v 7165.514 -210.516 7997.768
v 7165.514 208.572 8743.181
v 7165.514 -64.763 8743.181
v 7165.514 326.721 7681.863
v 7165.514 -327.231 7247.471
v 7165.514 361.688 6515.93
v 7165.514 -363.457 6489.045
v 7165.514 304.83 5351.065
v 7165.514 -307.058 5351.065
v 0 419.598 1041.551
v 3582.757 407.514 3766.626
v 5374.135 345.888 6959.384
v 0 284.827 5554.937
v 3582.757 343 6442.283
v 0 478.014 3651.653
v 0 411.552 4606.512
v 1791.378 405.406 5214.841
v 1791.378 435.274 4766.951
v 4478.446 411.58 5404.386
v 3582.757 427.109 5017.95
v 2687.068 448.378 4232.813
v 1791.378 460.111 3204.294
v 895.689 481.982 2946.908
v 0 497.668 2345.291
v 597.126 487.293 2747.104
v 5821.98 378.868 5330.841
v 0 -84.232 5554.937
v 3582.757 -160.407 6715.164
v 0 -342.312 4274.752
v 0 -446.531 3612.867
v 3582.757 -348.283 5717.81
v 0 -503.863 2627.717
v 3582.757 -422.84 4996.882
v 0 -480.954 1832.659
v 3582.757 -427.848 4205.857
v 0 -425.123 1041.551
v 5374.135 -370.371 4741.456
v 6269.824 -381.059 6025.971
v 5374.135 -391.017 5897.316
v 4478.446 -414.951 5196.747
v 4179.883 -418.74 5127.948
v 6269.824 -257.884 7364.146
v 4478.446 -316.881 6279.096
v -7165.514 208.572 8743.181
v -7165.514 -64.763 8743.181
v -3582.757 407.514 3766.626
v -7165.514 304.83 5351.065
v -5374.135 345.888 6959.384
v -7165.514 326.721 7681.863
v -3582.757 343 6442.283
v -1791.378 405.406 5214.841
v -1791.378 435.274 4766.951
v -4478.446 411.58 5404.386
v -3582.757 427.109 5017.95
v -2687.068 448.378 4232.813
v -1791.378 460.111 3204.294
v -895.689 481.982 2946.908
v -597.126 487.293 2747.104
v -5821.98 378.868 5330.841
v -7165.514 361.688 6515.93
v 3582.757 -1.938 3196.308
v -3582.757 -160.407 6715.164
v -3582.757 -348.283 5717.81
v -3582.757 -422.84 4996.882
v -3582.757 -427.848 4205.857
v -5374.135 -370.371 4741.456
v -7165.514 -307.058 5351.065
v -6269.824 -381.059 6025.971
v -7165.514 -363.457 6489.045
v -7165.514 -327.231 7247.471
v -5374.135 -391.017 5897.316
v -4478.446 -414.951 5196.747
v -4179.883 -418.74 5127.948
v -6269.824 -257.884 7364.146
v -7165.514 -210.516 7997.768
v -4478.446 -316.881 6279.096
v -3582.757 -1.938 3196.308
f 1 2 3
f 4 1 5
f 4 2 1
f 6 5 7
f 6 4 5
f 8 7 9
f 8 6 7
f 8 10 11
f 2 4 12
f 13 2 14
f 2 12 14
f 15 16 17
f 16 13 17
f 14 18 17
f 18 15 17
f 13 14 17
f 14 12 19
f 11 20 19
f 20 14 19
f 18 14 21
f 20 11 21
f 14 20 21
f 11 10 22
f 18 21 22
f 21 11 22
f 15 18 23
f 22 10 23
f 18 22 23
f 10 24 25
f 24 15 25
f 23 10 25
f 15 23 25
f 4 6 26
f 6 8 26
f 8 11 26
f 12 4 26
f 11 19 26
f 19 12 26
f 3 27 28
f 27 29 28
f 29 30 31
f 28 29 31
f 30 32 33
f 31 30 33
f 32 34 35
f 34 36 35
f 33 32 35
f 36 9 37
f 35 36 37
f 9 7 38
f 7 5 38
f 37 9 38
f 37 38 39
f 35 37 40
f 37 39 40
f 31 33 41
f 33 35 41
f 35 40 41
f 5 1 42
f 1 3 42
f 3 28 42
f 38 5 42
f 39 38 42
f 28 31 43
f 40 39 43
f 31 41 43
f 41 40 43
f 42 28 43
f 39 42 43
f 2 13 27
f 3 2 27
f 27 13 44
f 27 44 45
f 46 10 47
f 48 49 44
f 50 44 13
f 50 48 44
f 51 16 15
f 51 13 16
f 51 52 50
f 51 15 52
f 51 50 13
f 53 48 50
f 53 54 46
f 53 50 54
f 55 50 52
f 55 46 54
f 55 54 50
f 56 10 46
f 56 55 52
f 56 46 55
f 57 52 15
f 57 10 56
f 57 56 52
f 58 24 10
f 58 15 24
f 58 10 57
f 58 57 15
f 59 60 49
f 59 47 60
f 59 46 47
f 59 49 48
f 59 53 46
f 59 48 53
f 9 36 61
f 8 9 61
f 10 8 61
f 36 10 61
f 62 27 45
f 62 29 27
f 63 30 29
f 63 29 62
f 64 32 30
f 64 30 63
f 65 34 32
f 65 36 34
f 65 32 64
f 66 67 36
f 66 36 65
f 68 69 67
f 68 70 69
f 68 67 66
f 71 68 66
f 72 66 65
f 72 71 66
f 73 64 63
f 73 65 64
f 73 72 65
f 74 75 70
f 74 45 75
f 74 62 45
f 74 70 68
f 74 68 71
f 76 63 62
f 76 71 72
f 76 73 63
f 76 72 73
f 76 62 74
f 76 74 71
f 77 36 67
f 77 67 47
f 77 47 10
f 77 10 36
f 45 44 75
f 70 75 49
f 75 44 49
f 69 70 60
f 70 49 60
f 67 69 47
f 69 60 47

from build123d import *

# Parameters (mm, degrees)
SKETCH4_W          = 14453.89622635
SKETCH4_H          = 1933.47388346
CUT_EXTRUDE1_DEPTH = 11582.4


with BuildPart() as part:
    # Surface-Knit3: read off the stored shape, not the designer's step
    # Surface-Knit3: loft between two sections, ruled curve by curve
    surface_knit3_from = [
        Edge.make_bspline([(-18747.913519228, -33.291870667, 13896.687632722), (-18747.913519228, -38.996184814, 13864.165767164), (-18747.913519228, -47.395291612, 13815.326003064), (-18747.913519228, -58.165952375, 13750.098143781), (-18747.913519228, -66.001529187, 13701.124565247), (-18747.913519228, -73.566342631, 13652.099705476), (-18747.913519228, -80.832031101, 13603.025026666), (-18747.913519228, -87.770232991, 13553.901991014), (-18747.913519228, -94.352615351, 13504.731967053), (-18747.913519228, -100.550845229, 13455.516323317), (-18747.913519228, -106.336535483, 13406.256569089), (-18747.913519228, -111.681298966, 13356.954213653), (-18747.913519229, -116.556993503, 13307.61047422), (-18747.913519228, -120.934768836, 13258.226931647), (-18747.913519228, -124.787293043, 13208.804970061), (-18747.913519228, -128.084117978, 13159.345935701), (-18747.913519228, -130.802699249, 13109.851595466), (-18747.913519228, -132.971906369, 13060.326885108), (-18747.913519228, -134.6147206, 13010.776434683), (-18747.913519229, -135.756697629, 12961.204893031), (-18747.913519228, -136.422147725, 12911.6170991), (-18747.913519228, -136.635930916, 12862.017549986), (-18747.913519229, -136.422737614, 12812.411014843), (-18747.913519229, -135.807258229, 12762.802262828), (-18747.913519228, -134.814210194, 12713.195933045), (-18747.913519229, -133.468310939, 12663.596664599), (-18747.913519229, -131.794267082, 12614.009184506), (-18747.913519228, -129.816785237, 12564.438219781), (-18747.913519228, -126.808507959, 12498.371846627), (-18747.913519229, -122.413125762, 12415.853516057), (-18747.913519228, -118.351231597, 12349.932887402), (-18747.913519228, -116.216834875, 12317.002326935)], [0, 0, 0, 0, 0.0625, 0.09375, 0.125, 0.15625, 0.1875, 0.21875, 0.25, 0.28125, 0.3125, 0.34375, 0.375, 0.40625, 0.4375, 0.46875, 0.5, 0.53125, 0.5625, 0.59375, 0.625, 0.65625, 0.6875, 0.71875, 0.75, 0.78125, 0.8125, 0.84375, 0.875, 0.9375, 1, 1, 1, 1], 3),
        Edge.make_bspline([(-18747.913519228, 119.318075617, 12317.002326935), (-18747.913519228, 121.427288002, 12349.906607435), (-18747.913519229, 125.245922776, 12415.730130778), (-18747.913519228, 129.825309485, 12514.504470047), (-18747.913519228, 133.30695484, 12613.31210814), (-18747.913519229, 135.741648881, 12712.147152624), (-18747.913519228, 136.940477423, 12794.527823229), (-18747.913519228, 137.426859553, 12860.440198394), (-18747.913519229, 137.561675928, 12909.877734467), (-18747.913519228, 137.472892207, 12959.317860595), (-18747.913519228, 137.166808865, 13008.759745982), (-18747.913519229, 136.649726377, 13058.202559828), (-18747.913519228, 135.92839574, 13107.645897141), (-18747.913519229, 135.008041704, 13157.088667935), (-18747.913519228, 133.897934193, 13206.530592909), (-18747.913519229, 132.578650086, 13255.9684353), (-18747.913519228, 131.024813307, 13305.398752426), (-18747.913519229, 129.212987855, 13354.817901918), (-18747.913519229, 127.119170545, 13404.222444449), (-18747.913519228, 124.719358193, 13453.608940689), (-18747.913519228, 121.079727689, 13519.428839404), (-18747.913519229, 115.645624536, 13601.640967503), (-18747.913519228, 107.517806813, 13700.167248777), (-18747.913519228, 97.591624664, 13798.537247751), (-18747.913519228, 89.647575896, 13863.994418396), (-18747.913519228, 85.311986798, 13896.687632722)], [0, 0, 0, 0, 0.0625, 0.125, 0.1875, 0.25, 0.3125, 0.34375, 0.375, 0.40625, 0.4375, 0.46875, 0.5, 0.53125, 0.5625, 0.59375, 0.625, 0.65625, 0.6875, 0.71875, 0.75, 0.8125, 0.875, 0.9375, 1, 1, 1, 1], 3),
        Edge.make_line((-18747.913519228, -116.216834875, 12317.002326935), (-18747.913519228, 119.318075617, 12317.002326935)),
        Edge.make_line((-18747.913519228, 85.311986798, 13896.687632722), (-18747.913519228, -33.291870667, 13896.687632722)),
    ]
    surface_knit3_to = [
        Edge.make_bspline([(0, -84.232166366, 5554.937339031), (0, -101.79672971, 5462.01880107), (0, -129.357236092, 5322.688455814), (0, -167.450345309, 5136.915845411), (0, -196.42273433, 4997.563298319), (0, -225.527238329, 4858.164324098), (0, -254.493580408, 4718.695334102), (0, -283.051234262, 4579.132854165), (0, -310.930075038, 4439.453396797), (0, -337.859297077, 4299.633408984), (0, -363.569297954, 4159.649494874), (0, -387.788376954, 4019.477965049), (0, -410.248359478, 3879.095632891), (0, -430.67509131, 3738.47845439), (0, -448.805142559, 3597.603925682), (0, -464.354292773, 3456.446555804), (0, -477.089703526, 3314.988236979), (0, -487.191948377, 3173.270264273), (0, -494.801263778, 3031.328137811), (0, -500.07567179, 2889.199911148), (0, -503.164086093, 2746.922333211), (0, -504.220248686, 2604.532838899), (0, -503.395317672, 2462.068506491), (0, -500.841843712, 2319.566586545), (0, -496.711615776, 2177.064276035), (0, -491.156848446, 2034.598715165), (0, -484.32952174, 1892.20725343), (0, -476.381724655, 1749.92678358), (0, -464.49346954, 1560.417817143), (0, -447.592223813, 1323.994831696), (0, -432.705315369, 1135.550220194), (0, -425.123116762, 1041.550751068)], [0, 0, 0, 0, 0.0625, 0.09375, 0.125, 0.15625, 0.1875, 0.21875, 0.25, 0.28125, 0.3125, 0.34375, 0.375, 0.40625, 0.4375, 0.46875, 0.5, 0.53125, 0.5625, 0.59375, 0.625, 0.65625, 0.6875, 0.71875, 0.75, 0.78125, 0.8125, 0.84375, 0.875, 0.9375, 1, 1, 1, 1], 3),
        Edge.make_bspline([(0, 419.597820632, 1041.550751068), (0, 429.543853386, 1135.440295654), (0, 447.399313962, 1323.348388039), (0, 468.40352921, 1605.540291192), (0, 483.959642332, 1888.004992674), (0, 494.398471436, 2170.685059083), (0, 499.108853625, 2406.384051023), (0, 500.649329193, 2594.993626218), (0, 500.73224947, 2736.469141906), (0, 499.783776553, 2877.955586877), (0, 497.845912984, 3019.446002413), (0, 494.958769462, 3160.933085391), (0, 491.166077703, 3302.409896298), (0, 486.504516068, 3443.868951949), (0, 481.026248706, 3585.30385973), (0, 474.686548897, 3726.701576336), (0, 467.416919745, 3868.047425633), (0, 459.158051456, 4009.327380859), (0, 449.846016915, 4150.527054909), (0, 439.419277989, 4291.632309199), (0, 423.947050764, 4479.627594019), (0, 401.507651798, 4714.314399047), (0, 369.122895613, 4995.332543897), (0, 330.781905006, 5275.630891051), (0, 300.917896127, 5461.940505183), (0, 284.826924337, 5554.937339031)], [0, 0, 0, 0, 0.0625, 0.125, 0.1875, 0.25, 0.3125, 0.34375, 0.375, 0.40625, 0.4375, 0.46875, 0.5, 0.53125, 0.5625, 0.59375, 0.625, 0.65625, 0.6875, 0.71875, 0.75, 0.8125, 0.875, 0.9375, 1, 1, 1, 1], 3),
        Edge.make_line((0, -425.123116762, 1041.550751068), (0, 419.597820632, 1041.550751068)),
        Edge.make_line((0, 284.826924337, 5554.937339031), (0, -84.232166366, 5554.937339031)),
    ]
    surface_knit3 = Solid(Shell([*[Face.make_surface_from_curves(surface_knit3_from[k], surface_knit3_to[k]) for k in range(4)], Face(Wire(surface_knit3_from)), Face(Wire(surface_knit3_to))]))
    add(surface_knit3)

    # Sketch4 → Cut-Extrude1 (cut)
    with BuildSketch(Plane(origin=(-18747.913519229, 0, 0), x_dir=(0, 0, -1), z_dir=(1, 0, 0))):
        with Locations((-7774.786517892, 36.739287504)):
            Rectangle(SKETCH4_W, SKETCH4_H)
    extrude(amount=CUT_EXTRUDE1_DEPTH, mode=Mode.SUBTRACT)

    # Mirror1: part across plane


with BuildPart() as part_1:
    add(part.part)
    add(part.part.mirror(Plane(origin=(0, 0, 0), x_dir=(0, 0, 1), z_dir=(1, 0, 0))))


solid = part_1.part
